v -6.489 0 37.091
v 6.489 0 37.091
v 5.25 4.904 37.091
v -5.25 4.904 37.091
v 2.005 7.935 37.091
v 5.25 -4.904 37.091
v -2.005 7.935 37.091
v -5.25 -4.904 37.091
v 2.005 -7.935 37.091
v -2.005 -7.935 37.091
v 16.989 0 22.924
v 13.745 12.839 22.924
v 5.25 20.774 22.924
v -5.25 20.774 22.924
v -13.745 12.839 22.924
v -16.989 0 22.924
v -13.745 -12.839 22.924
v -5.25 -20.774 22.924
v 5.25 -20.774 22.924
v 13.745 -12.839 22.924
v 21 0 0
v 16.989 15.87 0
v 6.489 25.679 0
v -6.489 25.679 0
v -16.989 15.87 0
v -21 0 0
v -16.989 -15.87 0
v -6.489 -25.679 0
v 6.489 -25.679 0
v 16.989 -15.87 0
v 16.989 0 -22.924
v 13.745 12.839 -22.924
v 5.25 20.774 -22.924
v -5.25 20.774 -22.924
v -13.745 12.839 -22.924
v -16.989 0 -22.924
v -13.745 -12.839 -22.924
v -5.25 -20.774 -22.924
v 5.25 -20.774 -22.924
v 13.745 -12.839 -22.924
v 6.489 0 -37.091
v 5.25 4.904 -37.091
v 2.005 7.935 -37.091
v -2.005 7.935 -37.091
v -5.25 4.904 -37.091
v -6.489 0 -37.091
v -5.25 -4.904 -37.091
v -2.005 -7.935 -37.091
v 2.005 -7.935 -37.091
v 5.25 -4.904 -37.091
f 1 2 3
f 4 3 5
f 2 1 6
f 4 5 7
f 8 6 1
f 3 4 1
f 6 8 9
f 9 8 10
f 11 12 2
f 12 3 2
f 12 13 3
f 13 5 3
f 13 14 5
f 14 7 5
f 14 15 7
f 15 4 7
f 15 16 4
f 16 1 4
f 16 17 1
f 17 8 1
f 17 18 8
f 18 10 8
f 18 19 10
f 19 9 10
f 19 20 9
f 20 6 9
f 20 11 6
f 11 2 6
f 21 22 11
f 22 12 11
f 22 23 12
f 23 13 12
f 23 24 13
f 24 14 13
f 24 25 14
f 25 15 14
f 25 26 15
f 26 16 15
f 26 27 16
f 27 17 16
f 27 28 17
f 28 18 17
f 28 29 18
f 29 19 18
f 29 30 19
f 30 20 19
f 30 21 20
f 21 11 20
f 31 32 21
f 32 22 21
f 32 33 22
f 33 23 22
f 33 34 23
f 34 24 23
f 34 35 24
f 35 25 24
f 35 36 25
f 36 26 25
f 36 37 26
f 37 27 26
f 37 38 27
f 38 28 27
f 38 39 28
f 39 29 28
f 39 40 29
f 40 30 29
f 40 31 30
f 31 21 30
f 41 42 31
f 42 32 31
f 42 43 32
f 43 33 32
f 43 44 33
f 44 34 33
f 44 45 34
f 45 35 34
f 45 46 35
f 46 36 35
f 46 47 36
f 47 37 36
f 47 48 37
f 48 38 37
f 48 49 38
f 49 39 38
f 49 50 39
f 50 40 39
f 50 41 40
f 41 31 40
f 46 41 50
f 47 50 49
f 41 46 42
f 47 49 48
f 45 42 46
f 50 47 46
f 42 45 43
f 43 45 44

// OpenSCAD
// Generated by SolidPython 1.0.1 on 2020-07-29 00:46:47


scale(v = [7, 9, 13]) {
	sphere(r = 3);
}
/***********************************************
*********      SolidPython code:      **********
************************************************
 
# import packages: SolidPython
from solid import *
from solid.utils import *
from itertools import chain, combinations, permutations


class Resize:

    def __init__(self, scad_file):
        self.scad_file = scad_file
        #self.scad_file = import_scad(scad_file)
        # cone/cylinder param:
        self.r1 = 0
        self.r2 = 0
        self.h = 0
        # rectangular prism param:
        self.w = 0
        self.l = 0
        # ellipse param:
        self.r = 0

    # import OpenScad code (file name corresponds to shape)


    # classify shape + parameters
    def assign(self, param1, param2, param3):
        if self.scad_file == 'cone.scad':
            self.r1 = param1
            self.r2 = param2
            self.h = param3
        elif self.scad_file == 'cylinder.scad':
            self.r1 = param1
            self.r2 = param2
            self.h = param3
        elif self.scad_file == 'rectangularPrism.scad':
            self.h = param1
            self.l = param2
            self.w = param3
        else:
            self.r = param1
            self.h = param2

    # resize parameters
    def iterate(self):
        x = range(3, 20, 2)
        i = 1
        if self.scad_file == 'cone.scad':
            tempList = list(permutations(x, 2))
            for temp in tempList:
                param1 = temp[0]
                param2 = temp[1]
                filepath = 'produced_scad_files/' + 'cone' + str(param1) + '_' + str(param2) + '_' + '.scad'
                scad_render_to_file(cylinder(h=param1, r1=param2, r2=0), filepath)

        elif self.scad_file == 'cylinder.scad':
            tempList = list(permutations(x, 3))
            for temp in tempList:
                param1 = temp[0]
                param2 = temp[1]
                filepath = 'produced_scad_files/' + 'cylinder' + str(param1) + '_' + str(param2) + '_' + '.scad'
                scad_render_to_file(cylinder(h=param1, r1=param2, r2=param2), filepath)

        elif self.scad_file == 'rectangularPrism.scad':
            tempList = list(permutations(x, 3))
            for temp in tempList:
                param1 = temp[0]
                param2 = temp[1]
                param3 = temp[2]
                filepath = 'produced_scad_files/' + 'rectangularPrism' + str(param1) + '_' + str(param2) + '_' + str(
                    param3) + '.scad'
                scad_render_to_file(cube(size=(param1, param2, param3)), filepath)

        elif self.scad_file == 'ellipse.scad':
            tempList = list(permutations(x, 4))
            for temp in tempList:
                param1 = temp[0]
                param2 = temp[1]
                param3 = temp[2]
                param4 = temp[3]
                filepath = 'produced_scad_files/' + 'ellipse' + str(param1) + '_' + str(param2) + '_' + str(param3) + '_' + str(param4) + '.scad'
                scad_render_to_file(scale([param1, param2, param3])(sphere(r=param4)), filepath)

    def render_to_scadfile(self):
        scad_render_to_file(scad, 'example.scad') 
 
************************************************/
